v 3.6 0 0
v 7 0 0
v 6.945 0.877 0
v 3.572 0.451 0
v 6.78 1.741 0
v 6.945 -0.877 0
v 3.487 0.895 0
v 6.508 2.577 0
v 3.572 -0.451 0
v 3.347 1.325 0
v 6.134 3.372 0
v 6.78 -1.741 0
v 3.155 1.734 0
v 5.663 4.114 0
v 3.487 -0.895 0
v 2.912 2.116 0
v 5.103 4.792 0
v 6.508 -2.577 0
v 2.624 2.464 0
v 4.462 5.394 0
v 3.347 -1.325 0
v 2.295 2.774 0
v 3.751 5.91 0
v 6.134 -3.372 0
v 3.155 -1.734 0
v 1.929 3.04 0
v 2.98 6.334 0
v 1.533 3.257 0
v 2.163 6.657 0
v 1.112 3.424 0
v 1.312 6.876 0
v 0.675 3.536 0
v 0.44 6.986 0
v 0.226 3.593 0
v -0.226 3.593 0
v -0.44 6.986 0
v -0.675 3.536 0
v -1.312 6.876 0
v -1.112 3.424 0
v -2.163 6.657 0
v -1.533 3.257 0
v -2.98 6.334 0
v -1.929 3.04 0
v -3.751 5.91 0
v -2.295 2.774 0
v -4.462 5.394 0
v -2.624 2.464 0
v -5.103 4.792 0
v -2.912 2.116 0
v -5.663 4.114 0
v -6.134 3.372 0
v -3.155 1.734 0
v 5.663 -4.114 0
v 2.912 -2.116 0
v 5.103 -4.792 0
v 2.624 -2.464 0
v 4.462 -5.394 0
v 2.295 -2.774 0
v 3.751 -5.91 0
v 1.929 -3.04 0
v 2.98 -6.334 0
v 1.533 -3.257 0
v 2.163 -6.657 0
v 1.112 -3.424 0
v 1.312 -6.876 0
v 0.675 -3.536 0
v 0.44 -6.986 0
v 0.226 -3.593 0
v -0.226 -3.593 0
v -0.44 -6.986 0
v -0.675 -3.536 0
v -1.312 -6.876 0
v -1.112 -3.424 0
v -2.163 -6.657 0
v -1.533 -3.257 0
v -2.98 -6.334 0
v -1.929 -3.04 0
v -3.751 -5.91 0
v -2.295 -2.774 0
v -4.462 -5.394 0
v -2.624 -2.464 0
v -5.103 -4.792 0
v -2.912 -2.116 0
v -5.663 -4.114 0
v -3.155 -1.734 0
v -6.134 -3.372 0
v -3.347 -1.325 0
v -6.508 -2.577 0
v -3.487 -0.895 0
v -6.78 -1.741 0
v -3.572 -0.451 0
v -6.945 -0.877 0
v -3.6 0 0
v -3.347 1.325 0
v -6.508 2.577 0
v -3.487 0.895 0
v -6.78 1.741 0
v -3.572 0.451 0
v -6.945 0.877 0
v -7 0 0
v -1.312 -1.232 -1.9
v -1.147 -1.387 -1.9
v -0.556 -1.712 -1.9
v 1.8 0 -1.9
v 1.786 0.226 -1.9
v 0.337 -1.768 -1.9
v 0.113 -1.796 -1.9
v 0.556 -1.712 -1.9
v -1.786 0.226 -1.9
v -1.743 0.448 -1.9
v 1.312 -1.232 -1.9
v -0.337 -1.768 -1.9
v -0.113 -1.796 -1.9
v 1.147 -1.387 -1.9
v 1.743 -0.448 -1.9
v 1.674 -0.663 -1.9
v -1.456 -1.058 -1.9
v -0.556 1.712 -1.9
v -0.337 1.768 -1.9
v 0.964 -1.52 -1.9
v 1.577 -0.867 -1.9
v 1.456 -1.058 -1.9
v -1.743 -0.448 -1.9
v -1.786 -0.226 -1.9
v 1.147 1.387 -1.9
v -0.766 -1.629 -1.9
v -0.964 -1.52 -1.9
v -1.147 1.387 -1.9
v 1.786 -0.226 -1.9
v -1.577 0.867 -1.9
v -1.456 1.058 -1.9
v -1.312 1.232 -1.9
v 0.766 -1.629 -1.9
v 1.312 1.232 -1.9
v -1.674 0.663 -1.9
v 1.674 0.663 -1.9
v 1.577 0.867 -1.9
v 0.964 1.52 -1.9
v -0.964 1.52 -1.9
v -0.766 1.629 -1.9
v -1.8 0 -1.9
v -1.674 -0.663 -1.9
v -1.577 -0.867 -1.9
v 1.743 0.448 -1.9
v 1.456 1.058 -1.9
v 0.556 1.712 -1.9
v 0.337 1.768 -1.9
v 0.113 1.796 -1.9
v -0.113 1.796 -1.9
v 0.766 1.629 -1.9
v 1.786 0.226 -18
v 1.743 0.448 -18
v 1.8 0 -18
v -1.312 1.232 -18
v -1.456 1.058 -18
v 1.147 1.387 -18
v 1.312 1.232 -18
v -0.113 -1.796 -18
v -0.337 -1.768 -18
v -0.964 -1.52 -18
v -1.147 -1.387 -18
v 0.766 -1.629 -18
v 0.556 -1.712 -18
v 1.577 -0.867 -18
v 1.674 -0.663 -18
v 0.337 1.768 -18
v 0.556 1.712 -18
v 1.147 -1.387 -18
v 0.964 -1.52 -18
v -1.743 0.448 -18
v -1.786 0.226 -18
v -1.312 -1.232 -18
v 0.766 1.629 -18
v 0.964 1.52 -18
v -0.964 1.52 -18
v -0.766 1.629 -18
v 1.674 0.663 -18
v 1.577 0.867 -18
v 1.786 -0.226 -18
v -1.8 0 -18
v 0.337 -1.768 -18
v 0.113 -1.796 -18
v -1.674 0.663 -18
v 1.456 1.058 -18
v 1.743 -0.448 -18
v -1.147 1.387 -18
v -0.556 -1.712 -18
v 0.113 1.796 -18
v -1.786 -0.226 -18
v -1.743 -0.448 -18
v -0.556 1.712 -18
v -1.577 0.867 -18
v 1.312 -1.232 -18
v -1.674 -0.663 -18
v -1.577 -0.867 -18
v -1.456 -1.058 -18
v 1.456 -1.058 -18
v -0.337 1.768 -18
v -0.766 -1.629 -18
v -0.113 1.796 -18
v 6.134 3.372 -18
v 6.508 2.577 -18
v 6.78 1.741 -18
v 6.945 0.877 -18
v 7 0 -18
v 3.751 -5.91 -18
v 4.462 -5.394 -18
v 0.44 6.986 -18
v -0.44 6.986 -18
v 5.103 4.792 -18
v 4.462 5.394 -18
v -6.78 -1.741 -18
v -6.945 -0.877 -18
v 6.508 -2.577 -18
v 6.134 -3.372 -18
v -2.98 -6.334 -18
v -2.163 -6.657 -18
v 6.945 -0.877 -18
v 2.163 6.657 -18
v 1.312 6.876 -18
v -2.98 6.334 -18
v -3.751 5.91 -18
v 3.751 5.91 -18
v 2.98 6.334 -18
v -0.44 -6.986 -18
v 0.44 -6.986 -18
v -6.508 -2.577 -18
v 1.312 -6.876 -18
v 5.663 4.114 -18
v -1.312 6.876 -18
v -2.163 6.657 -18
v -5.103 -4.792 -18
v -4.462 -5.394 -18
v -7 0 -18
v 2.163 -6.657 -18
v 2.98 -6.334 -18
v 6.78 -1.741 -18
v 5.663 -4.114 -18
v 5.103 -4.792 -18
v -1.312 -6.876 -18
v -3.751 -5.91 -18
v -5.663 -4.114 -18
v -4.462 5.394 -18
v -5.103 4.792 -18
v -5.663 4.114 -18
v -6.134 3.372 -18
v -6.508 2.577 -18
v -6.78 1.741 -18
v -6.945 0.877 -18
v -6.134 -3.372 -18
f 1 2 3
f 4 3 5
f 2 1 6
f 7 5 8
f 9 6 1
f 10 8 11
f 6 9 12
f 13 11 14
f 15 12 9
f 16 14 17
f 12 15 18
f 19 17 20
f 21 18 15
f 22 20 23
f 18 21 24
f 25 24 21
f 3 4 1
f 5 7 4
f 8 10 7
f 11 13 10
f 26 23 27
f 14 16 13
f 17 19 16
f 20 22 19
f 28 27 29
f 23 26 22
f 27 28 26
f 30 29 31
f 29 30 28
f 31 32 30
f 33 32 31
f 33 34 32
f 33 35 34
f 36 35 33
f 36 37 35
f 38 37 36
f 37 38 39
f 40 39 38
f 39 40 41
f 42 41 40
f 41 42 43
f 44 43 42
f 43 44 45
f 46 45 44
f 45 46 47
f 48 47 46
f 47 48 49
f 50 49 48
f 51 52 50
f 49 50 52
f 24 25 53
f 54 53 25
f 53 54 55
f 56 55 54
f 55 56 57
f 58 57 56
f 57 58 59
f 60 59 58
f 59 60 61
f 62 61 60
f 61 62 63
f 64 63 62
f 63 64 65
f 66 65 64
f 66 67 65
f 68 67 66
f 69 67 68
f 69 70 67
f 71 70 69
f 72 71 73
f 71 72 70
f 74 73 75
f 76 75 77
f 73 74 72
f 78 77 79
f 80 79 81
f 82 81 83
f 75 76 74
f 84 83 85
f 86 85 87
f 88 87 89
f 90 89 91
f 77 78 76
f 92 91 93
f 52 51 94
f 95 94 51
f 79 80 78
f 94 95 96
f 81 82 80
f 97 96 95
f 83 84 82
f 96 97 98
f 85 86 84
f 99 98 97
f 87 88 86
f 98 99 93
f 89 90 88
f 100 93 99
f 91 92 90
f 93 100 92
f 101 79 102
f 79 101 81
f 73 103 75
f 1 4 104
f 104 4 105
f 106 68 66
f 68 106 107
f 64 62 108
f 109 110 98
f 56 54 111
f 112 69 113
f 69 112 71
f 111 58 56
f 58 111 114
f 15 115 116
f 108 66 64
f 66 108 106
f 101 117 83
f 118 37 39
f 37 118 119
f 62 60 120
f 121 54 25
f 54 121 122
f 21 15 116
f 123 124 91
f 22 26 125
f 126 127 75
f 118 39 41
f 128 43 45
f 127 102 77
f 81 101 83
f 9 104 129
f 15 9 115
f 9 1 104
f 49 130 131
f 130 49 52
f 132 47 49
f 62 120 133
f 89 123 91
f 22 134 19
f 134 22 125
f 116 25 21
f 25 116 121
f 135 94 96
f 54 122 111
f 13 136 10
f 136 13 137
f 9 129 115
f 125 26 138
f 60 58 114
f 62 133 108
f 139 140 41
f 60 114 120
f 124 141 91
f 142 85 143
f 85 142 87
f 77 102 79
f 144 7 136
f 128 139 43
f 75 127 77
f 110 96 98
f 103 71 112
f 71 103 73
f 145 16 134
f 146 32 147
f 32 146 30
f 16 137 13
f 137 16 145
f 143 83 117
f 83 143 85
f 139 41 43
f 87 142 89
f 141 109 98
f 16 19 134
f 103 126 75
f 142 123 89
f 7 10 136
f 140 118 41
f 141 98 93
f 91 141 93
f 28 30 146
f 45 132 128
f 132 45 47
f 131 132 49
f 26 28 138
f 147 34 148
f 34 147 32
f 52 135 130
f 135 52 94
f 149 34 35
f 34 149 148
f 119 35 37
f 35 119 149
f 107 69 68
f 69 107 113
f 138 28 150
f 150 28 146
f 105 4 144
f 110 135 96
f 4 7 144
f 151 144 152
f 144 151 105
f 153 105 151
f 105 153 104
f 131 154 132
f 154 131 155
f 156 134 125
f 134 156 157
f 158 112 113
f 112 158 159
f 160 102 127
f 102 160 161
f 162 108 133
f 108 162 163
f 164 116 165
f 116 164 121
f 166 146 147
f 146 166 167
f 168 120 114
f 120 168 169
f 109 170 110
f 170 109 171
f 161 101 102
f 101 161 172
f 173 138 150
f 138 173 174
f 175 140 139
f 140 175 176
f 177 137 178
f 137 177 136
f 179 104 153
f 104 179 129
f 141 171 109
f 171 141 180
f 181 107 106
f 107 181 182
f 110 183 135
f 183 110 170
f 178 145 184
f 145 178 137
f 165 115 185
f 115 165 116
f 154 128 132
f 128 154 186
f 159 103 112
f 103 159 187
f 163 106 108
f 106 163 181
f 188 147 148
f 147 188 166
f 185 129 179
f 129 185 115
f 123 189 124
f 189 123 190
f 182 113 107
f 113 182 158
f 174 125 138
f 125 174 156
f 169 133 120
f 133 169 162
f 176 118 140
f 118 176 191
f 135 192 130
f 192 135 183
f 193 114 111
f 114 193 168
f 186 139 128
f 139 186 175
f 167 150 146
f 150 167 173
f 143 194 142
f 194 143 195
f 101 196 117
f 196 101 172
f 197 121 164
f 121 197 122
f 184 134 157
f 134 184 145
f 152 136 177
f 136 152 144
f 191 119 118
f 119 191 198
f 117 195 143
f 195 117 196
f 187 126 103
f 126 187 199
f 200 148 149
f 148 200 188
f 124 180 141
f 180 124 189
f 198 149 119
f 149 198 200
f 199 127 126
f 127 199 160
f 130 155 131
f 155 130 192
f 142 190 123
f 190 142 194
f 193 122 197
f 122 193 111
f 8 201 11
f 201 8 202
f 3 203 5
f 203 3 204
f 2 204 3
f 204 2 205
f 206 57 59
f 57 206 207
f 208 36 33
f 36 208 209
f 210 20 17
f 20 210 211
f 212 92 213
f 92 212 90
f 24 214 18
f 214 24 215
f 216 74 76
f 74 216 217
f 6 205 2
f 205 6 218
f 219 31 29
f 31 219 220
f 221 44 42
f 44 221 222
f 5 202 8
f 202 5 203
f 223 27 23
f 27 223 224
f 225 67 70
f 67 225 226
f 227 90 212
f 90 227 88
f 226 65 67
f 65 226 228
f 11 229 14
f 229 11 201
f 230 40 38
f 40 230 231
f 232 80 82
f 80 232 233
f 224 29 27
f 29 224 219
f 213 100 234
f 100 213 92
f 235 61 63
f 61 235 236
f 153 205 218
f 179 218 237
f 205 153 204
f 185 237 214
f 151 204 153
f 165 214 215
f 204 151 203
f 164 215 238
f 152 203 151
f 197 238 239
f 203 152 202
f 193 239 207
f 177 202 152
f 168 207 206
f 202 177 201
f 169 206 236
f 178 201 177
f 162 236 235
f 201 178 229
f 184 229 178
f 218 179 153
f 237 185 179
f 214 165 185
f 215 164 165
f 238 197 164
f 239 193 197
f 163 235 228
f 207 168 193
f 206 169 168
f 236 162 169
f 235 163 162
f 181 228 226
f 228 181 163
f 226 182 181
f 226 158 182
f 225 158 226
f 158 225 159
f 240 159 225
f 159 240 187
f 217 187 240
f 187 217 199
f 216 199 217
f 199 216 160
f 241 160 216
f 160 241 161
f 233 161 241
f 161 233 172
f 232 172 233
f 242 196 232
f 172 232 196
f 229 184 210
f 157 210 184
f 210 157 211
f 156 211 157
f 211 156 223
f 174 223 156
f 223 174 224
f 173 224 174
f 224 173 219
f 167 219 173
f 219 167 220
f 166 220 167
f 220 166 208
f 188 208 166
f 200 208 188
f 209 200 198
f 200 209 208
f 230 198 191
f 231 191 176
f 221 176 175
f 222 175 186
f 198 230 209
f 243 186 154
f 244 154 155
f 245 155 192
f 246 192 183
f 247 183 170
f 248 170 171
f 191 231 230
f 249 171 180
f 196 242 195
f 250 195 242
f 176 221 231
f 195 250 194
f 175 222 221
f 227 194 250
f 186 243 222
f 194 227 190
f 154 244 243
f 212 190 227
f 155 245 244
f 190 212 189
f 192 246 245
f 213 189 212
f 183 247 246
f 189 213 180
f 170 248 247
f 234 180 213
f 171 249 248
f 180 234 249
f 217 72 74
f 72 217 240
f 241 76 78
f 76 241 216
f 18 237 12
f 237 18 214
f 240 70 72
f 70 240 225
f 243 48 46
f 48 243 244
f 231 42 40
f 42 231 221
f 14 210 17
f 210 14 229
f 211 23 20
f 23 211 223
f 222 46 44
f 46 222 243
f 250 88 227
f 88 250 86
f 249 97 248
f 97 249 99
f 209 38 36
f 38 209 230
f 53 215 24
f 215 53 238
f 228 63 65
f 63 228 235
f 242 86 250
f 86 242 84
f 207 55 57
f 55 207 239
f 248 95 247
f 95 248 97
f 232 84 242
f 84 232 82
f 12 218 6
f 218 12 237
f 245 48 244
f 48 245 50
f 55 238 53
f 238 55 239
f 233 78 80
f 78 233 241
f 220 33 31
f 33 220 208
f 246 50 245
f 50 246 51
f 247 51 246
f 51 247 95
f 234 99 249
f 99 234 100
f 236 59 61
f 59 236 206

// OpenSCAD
$fn = 50;


difference() {
	union() {
		translate(v = [0, 0, -18.0000000000]) {
			cylinder(h = 18, r = 7.0000000000);
		}
	}
	union() {
		translate(v = [0, 0, 0]) {
			rotate(a = [0, 0, 0]) {
				difference() {
					union() {
						translate(v = [0, 0, -21.0000000000]) {
							cylinder(h = 21, r = 1.5000000000);
						}
						translate(v = [0, 0, -1.9000000000]) {
							cylinder(h = 1.9000000000, r1 = 1.8000000000, r2 = 3.6000000000);
						}
						translate(v = [0, 0, -21.0000000000]) {
							cylinder(h = 21, r = 1.8000000000);
						}
						translate(v = [0, 0, -21.0000000000]) {
							cylinder(h = 21, r = 1.5000000000);
						}
					}
					union();
				}
			}
		}
	}
}
